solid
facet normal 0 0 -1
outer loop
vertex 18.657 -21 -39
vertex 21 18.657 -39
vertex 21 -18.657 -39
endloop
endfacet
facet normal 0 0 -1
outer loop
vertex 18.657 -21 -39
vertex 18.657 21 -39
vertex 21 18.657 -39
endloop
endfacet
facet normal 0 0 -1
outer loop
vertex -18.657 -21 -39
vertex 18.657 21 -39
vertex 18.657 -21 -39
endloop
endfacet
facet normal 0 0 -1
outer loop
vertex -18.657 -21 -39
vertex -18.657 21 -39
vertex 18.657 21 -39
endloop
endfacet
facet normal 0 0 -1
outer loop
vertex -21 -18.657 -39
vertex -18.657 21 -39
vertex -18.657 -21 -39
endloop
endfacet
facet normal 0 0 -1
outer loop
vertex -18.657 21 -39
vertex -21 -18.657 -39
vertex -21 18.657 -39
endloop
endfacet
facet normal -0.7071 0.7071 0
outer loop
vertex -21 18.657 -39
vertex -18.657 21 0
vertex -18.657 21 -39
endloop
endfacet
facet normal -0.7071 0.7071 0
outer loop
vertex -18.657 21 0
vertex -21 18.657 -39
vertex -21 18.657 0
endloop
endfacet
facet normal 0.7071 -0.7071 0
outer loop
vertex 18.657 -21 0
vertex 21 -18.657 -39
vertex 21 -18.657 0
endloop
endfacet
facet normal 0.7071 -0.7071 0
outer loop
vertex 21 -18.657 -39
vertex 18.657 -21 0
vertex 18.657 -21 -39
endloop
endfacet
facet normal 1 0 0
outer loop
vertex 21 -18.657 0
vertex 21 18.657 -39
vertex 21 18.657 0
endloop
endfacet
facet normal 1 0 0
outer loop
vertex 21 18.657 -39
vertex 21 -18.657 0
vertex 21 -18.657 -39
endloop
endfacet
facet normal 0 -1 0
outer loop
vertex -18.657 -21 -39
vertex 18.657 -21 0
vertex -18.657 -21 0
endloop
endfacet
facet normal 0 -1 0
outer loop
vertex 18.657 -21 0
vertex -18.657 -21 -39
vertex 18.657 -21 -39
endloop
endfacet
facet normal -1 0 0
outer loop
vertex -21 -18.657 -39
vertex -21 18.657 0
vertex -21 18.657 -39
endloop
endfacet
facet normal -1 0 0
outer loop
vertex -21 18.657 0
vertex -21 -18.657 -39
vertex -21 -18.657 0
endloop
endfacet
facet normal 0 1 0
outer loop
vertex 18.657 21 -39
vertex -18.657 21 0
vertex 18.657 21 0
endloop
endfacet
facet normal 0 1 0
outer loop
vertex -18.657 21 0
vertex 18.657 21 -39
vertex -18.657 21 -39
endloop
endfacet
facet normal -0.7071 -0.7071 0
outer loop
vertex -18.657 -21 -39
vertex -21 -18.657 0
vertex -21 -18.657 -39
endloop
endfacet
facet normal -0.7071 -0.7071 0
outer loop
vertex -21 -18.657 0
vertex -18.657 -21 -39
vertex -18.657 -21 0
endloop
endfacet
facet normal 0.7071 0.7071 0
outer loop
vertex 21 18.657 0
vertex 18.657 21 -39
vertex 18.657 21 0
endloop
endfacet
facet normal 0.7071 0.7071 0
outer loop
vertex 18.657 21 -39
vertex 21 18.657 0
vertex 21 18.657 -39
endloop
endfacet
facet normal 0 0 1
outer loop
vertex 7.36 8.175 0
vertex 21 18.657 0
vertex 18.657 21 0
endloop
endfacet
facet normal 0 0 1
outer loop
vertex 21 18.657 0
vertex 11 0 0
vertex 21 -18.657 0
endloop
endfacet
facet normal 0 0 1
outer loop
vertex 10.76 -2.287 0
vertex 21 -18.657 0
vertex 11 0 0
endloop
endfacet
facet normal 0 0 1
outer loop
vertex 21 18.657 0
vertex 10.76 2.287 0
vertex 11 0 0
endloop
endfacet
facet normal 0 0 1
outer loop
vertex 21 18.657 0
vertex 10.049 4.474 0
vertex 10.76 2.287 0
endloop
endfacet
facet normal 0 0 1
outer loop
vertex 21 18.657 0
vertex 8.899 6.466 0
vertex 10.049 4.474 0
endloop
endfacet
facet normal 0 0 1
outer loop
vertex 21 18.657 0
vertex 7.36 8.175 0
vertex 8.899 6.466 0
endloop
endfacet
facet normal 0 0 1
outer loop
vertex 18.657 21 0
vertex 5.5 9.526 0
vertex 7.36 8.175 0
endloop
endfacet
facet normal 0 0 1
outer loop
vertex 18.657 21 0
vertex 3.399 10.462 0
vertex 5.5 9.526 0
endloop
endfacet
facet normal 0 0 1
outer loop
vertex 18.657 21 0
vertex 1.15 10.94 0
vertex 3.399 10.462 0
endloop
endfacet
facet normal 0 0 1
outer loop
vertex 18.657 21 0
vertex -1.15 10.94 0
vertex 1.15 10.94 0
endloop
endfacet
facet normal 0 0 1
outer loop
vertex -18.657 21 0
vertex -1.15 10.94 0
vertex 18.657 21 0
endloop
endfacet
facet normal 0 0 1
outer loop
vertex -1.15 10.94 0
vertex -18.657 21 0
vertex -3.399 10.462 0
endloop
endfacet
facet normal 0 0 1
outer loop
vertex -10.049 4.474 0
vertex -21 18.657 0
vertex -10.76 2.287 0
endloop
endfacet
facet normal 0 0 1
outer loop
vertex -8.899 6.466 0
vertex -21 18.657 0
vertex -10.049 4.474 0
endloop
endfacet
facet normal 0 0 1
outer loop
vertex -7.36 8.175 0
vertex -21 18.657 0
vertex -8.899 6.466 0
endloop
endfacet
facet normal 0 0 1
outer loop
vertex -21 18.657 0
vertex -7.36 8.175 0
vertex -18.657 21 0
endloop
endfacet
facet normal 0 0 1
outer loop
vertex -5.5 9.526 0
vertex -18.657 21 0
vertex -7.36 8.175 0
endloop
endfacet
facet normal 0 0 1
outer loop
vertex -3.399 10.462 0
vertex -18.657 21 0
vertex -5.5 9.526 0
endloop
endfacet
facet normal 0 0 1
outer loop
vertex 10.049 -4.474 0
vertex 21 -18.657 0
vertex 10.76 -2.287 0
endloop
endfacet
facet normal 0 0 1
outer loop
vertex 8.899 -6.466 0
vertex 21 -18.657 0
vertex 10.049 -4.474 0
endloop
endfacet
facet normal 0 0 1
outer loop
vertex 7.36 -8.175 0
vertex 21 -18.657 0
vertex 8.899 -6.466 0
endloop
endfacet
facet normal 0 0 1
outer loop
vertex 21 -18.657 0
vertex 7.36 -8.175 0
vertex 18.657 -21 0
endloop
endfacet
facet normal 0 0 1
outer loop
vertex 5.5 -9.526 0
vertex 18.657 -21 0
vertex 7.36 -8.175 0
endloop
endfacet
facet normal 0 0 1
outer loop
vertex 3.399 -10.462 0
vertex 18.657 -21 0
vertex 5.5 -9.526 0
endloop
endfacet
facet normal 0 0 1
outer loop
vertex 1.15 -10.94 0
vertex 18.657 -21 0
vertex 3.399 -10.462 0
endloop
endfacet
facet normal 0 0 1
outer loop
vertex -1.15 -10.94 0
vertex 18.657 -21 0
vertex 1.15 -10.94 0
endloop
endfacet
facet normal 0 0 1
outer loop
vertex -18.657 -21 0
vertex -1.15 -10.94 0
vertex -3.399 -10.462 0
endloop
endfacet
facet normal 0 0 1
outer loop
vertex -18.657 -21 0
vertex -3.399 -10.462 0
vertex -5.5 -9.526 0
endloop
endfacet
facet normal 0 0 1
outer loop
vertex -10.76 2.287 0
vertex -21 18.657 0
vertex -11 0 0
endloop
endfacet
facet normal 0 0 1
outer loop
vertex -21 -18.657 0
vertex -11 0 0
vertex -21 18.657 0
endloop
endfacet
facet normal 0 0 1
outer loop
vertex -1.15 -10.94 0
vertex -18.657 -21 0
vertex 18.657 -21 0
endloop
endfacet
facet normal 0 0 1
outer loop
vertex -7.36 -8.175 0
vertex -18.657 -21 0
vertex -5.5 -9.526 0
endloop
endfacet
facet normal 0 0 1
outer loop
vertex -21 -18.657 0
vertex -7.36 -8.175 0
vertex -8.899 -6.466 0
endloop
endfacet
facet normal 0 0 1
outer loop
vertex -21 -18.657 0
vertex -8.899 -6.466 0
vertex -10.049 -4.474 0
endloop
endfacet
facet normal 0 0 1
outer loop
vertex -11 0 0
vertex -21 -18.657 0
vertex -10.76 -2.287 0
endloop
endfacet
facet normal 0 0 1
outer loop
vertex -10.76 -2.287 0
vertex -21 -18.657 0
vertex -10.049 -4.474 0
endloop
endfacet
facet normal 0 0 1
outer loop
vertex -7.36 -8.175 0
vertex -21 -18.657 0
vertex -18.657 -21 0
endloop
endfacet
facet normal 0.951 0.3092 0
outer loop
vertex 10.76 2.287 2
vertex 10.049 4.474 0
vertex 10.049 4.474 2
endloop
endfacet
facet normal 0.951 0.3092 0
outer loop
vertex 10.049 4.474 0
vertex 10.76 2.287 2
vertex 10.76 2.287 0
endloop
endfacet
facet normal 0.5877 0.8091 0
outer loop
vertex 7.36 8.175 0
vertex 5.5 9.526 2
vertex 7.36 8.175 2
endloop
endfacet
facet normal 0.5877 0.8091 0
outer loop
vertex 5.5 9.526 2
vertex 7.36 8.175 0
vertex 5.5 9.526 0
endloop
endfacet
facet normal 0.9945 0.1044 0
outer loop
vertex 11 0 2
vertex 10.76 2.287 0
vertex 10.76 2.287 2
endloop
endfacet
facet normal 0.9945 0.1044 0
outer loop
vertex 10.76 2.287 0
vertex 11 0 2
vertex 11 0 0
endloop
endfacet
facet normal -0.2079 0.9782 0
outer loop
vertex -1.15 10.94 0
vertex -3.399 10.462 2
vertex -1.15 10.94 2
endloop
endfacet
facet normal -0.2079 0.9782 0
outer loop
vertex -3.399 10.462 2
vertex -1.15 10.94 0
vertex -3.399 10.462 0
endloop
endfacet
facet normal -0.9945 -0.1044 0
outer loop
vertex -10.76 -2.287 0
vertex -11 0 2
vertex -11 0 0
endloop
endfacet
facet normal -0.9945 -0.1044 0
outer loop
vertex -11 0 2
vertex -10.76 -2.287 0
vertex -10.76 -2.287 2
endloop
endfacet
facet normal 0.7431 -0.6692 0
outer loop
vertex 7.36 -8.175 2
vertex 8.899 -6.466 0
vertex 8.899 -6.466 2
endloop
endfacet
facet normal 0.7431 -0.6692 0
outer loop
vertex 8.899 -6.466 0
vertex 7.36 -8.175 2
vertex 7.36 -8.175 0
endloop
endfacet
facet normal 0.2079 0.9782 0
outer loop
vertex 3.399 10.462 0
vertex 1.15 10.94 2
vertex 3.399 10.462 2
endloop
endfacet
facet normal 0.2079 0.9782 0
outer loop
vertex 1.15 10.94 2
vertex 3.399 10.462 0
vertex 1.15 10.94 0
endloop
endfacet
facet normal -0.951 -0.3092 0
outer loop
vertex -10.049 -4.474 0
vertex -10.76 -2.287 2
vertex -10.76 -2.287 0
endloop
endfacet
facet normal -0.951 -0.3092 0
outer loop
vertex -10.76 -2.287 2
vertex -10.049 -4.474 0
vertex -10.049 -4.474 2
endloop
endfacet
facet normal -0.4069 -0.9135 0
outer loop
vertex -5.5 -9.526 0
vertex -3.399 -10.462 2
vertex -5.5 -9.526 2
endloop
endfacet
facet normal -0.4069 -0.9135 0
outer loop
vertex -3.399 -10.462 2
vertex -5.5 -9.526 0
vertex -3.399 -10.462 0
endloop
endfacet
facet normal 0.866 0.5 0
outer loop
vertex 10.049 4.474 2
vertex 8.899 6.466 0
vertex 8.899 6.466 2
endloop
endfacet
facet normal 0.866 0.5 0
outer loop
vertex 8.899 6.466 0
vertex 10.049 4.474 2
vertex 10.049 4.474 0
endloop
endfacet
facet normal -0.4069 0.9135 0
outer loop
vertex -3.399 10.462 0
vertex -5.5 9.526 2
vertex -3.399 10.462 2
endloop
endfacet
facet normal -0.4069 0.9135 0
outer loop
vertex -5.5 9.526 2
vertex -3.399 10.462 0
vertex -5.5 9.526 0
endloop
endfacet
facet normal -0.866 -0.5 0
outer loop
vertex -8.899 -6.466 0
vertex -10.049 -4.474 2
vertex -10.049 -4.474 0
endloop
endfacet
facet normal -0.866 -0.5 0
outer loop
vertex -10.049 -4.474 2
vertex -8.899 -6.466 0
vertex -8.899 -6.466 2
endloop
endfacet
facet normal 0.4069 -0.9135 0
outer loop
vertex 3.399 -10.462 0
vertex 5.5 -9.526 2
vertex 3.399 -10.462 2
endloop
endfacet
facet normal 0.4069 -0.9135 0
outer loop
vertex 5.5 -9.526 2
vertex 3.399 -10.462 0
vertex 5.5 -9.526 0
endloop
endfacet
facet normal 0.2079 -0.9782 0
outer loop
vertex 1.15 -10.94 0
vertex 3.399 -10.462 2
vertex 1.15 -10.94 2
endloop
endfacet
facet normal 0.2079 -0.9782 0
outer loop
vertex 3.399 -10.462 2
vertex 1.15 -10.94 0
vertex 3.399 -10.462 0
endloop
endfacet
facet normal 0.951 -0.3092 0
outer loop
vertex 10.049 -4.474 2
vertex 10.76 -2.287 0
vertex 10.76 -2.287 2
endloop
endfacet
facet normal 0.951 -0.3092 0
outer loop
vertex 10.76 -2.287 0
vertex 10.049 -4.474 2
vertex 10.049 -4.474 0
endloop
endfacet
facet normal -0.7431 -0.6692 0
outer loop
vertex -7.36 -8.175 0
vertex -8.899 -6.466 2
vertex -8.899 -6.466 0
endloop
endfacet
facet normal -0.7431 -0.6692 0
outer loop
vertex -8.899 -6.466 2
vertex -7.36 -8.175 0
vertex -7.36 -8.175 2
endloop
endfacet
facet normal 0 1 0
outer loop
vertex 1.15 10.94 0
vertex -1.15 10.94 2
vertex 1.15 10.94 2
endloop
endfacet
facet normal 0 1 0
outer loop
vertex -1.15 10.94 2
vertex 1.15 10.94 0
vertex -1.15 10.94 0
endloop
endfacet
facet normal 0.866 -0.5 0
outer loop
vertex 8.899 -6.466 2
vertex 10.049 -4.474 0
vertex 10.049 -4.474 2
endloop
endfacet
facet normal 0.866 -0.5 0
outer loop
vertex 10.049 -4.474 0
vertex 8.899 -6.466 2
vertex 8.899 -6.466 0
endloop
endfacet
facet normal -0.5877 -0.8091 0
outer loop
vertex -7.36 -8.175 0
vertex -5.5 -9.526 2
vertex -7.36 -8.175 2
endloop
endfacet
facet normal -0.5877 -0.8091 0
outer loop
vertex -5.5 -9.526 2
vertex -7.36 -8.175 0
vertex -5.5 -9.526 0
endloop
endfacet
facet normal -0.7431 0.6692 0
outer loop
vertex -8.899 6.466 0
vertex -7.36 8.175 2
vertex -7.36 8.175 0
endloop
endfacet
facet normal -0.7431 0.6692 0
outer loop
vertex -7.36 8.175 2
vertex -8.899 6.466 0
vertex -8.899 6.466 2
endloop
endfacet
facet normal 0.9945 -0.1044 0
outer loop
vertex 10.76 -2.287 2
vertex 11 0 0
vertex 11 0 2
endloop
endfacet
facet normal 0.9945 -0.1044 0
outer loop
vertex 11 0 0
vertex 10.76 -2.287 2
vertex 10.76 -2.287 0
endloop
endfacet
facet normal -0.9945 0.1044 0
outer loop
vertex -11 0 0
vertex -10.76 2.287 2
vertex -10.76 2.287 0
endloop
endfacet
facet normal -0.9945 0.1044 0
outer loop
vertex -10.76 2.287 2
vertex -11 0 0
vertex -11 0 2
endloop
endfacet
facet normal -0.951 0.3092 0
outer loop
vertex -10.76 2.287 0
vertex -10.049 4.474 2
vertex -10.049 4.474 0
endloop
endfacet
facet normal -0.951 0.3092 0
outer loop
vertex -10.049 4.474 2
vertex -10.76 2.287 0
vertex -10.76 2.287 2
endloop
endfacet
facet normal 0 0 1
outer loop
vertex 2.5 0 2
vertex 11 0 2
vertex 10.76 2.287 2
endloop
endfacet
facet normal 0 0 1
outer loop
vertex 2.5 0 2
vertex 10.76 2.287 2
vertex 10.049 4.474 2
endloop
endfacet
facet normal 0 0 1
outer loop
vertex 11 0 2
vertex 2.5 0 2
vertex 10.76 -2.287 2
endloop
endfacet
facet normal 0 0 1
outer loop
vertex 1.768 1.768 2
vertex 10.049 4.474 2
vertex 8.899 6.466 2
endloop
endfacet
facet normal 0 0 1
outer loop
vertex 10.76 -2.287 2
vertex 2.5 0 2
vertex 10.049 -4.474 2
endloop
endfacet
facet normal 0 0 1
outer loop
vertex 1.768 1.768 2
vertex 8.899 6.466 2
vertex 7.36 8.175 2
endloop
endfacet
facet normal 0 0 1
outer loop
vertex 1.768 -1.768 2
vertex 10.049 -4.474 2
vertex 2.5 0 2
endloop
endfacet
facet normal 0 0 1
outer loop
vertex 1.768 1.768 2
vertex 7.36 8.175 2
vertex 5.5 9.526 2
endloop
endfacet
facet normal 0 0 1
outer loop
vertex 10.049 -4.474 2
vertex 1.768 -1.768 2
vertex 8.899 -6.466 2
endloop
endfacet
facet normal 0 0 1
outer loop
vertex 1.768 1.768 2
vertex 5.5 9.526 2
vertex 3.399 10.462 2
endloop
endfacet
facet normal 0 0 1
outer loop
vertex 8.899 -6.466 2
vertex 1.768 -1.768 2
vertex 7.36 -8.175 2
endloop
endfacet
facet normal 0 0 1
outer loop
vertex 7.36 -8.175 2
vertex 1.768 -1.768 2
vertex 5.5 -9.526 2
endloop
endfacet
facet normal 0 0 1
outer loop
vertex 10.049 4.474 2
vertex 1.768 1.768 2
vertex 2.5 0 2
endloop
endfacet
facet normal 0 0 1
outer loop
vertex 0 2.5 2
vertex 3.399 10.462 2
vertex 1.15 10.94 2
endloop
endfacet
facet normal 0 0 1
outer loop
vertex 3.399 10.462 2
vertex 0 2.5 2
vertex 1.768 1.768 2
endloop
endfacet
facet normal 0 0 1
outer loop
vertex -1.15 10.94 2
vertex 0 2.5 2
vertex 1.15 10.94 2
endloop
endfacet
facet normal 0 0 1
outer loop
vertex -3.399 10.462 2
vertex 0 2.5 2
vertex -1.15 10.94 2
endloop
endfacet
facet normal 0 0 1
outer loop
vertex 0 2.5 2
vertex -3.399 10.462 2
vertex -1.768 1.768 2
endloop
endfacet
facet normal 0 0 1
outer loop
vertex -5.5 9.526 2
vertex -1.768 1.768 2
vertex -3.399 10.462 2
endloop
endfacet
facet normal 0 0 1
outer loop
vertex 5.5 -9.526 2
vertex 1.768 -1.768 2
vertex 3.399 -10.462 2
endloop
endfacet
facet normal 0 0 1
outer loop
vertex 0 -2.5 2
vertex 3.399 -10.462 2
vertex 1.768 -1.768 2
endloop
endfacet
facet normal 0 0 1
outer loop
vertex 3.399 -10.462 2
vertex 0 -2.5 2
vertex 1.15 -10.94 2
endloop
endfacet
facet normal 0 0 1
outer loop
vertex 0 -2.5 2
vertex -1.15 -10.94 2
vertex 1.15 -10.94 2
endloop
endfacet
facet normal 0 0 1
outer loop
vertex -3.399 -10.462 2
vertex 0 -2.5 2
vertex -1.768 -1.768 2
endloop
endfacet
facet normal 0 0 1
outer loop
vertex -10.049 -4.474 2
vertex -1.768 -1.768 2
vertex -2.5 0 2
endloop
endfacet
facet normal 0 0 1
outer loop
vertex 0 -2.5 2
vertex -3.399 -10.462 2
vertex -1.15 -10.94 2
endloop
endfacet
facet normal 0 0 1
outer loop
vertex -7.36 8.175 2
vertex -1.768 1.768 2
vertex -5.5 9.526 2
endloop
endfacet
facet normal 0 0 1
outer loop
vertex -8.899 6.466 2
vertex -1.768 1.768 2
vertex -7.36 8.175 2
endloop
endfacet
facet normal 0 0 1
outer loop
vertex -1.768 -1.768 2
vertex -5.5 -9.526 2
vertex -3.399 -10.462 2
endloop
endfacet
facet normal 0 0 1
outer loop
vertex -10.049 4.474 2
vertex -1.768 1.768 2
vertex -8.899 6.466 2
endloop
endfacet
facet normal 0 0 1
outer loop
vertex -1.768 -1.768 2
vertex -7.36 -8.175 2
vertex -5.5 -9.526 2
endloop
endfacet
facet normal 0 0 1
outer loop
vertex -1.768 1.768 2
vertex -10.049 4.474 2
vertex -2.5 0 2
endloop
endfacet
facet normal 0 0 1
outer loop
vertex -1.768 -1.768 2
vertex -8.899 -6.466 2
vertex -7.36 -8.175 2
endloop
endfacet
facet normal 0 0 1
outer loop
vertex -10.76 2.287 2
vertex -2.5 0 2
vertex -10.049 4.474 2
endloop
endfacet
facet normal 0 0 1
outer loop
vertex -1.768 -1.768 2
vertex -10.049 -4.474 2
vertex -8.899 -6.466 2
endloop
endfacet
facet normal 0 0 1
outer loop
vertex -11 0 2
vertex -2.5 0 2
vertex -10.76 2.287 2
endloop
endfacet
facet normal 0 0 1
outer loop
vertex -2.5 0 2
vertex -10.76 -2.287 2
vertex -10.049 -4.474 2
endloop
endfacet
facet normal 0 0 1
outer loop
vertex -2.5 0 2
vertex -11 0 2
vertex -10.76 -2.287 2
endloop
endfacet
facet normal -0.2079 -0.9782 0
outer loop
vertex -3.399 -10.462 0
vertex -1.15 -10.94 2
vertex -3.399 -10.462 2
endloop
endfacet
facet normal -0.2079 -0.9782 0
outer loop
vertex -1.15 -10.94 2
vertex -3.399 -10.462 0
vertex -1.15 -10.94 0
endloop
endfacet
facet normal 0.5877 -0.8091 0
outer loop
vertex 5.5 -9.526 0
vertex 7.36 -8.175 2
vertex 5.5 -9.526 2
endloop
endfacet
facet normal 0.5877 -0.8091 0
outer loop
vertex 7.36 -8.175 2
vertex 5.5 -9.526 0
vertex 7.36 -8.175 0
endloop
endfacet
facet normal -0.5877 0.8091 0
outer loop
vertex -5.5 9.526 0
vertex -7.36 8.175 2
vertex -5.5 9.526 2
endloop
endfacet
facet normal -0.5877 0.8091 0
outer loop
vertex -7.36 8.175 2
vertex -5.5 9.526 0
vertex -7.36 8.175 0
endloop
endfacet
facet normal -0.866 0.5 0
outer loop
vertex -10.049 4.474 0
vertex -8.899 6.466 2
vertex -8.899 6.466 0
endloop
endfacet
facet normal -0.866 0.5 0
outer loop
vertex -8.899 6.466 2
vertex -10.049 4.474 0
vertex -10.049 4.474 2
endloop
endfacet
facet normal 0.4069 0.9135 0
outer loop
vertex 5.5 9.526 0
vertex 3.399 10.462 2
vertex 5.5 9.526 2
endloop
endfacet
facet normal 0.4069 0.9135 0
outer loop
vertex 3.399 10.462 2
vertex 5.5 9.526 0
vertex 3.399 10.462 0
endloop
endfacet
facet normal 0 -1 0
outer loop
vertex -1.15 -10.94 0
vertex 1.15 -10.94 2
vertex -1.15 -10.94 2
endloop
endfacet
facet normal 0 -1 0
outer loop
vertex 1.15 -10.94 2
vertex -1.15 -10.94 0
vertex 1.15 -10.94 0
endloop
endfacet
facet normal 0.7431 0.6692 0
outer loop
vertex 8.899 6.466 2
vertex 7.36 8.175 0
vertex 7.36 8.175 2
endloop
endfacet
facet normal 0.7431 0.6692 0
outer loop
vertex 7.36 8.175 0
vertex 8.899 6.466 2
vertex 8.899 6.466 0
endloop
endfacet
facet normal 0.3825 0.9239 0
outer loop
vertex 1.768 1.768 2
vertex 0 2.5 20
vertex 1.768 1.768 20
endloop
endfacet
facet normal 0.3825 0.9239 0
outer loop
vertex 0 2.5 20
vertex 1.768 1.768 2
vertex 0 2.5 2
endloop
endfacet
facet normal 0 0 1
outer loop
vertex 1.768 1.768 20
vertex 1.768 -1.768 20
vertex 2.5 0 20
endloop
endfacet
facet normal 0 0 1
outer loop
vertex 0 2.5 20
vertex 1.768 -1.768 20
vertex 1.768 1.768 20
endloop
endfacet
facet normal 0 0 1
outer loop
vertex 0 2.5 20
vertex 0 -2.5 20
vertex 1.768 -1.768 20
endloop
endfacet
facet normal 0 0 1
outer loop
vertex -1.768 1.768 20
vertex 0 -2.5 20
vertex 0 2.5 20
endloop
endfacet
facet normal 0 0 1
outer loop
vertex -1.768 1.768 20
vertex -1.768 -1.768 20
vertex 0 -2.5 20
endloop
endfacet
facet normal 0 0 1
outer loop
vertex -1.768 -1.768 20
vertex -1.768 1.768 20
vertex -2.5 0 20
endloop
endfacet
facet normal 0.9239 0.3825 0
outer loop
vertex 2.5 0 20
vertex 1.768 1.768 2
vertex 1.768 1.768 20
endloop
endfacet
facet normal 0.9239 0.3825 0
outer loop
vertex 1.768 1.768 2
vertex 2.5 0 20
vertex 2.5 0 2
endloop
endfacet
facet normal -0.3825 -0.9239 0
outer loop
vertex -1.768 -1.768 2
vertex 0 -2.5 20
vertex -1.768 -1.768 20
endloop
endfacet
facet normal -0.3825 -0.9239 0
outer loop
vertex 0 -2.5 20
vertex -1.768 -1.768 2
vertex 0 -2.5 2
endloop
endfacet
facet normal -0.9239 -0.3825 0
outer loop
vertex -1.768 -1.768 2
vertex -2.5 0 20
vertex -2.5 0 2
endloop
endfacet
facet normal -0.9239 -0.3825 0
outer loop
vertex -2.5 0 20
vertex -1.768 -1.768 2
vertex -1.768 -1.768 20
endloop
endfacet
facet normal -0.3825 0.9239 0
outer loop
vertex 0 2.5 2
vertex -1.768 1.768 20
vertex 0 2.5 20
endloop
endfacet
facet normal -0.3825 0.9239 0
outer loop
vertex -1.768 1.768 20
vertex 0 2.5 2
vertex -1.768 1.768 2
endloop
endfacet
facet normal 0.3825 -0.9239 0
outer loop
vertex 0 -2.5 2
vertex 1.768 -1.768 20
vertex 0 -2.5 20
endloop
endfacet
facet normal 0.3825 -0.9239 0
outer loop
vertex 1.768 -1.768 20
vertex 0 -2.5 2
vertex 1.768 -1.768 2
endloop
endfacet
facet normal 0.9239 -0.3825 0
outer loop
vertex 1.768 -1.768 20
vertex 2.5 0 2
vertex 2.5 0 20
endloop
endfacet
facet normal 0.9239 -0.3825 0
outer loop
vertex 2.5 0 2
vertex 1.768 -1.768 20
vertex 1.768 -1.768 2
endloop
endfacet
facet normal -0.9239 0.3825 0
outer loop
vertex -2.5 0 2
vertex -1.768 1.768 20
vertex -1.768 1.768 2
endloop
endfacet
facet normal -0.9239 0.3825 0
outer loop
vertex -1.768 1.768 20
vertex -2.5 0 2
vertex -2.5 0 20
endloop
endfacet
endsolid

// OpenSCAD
module nema17 () {
    rotate([180,0,0]) linear_extrude(39) nema17_face_profile();
    linear_extrude(2) circle(d=22);
    #translate([0,0,2]) linear_extrude(18) circle(d=5);
}



module nema17_face_profile() {
    difference() {
        offset(delta=4, chamfer=true) square([34,34], center=true);
        for (a=[45:90:360-45]) rotate([0,0,a]) translate([44/2,0,34-10]) linear_extrude(10) circle(d=3);
    }
}

nema17();
